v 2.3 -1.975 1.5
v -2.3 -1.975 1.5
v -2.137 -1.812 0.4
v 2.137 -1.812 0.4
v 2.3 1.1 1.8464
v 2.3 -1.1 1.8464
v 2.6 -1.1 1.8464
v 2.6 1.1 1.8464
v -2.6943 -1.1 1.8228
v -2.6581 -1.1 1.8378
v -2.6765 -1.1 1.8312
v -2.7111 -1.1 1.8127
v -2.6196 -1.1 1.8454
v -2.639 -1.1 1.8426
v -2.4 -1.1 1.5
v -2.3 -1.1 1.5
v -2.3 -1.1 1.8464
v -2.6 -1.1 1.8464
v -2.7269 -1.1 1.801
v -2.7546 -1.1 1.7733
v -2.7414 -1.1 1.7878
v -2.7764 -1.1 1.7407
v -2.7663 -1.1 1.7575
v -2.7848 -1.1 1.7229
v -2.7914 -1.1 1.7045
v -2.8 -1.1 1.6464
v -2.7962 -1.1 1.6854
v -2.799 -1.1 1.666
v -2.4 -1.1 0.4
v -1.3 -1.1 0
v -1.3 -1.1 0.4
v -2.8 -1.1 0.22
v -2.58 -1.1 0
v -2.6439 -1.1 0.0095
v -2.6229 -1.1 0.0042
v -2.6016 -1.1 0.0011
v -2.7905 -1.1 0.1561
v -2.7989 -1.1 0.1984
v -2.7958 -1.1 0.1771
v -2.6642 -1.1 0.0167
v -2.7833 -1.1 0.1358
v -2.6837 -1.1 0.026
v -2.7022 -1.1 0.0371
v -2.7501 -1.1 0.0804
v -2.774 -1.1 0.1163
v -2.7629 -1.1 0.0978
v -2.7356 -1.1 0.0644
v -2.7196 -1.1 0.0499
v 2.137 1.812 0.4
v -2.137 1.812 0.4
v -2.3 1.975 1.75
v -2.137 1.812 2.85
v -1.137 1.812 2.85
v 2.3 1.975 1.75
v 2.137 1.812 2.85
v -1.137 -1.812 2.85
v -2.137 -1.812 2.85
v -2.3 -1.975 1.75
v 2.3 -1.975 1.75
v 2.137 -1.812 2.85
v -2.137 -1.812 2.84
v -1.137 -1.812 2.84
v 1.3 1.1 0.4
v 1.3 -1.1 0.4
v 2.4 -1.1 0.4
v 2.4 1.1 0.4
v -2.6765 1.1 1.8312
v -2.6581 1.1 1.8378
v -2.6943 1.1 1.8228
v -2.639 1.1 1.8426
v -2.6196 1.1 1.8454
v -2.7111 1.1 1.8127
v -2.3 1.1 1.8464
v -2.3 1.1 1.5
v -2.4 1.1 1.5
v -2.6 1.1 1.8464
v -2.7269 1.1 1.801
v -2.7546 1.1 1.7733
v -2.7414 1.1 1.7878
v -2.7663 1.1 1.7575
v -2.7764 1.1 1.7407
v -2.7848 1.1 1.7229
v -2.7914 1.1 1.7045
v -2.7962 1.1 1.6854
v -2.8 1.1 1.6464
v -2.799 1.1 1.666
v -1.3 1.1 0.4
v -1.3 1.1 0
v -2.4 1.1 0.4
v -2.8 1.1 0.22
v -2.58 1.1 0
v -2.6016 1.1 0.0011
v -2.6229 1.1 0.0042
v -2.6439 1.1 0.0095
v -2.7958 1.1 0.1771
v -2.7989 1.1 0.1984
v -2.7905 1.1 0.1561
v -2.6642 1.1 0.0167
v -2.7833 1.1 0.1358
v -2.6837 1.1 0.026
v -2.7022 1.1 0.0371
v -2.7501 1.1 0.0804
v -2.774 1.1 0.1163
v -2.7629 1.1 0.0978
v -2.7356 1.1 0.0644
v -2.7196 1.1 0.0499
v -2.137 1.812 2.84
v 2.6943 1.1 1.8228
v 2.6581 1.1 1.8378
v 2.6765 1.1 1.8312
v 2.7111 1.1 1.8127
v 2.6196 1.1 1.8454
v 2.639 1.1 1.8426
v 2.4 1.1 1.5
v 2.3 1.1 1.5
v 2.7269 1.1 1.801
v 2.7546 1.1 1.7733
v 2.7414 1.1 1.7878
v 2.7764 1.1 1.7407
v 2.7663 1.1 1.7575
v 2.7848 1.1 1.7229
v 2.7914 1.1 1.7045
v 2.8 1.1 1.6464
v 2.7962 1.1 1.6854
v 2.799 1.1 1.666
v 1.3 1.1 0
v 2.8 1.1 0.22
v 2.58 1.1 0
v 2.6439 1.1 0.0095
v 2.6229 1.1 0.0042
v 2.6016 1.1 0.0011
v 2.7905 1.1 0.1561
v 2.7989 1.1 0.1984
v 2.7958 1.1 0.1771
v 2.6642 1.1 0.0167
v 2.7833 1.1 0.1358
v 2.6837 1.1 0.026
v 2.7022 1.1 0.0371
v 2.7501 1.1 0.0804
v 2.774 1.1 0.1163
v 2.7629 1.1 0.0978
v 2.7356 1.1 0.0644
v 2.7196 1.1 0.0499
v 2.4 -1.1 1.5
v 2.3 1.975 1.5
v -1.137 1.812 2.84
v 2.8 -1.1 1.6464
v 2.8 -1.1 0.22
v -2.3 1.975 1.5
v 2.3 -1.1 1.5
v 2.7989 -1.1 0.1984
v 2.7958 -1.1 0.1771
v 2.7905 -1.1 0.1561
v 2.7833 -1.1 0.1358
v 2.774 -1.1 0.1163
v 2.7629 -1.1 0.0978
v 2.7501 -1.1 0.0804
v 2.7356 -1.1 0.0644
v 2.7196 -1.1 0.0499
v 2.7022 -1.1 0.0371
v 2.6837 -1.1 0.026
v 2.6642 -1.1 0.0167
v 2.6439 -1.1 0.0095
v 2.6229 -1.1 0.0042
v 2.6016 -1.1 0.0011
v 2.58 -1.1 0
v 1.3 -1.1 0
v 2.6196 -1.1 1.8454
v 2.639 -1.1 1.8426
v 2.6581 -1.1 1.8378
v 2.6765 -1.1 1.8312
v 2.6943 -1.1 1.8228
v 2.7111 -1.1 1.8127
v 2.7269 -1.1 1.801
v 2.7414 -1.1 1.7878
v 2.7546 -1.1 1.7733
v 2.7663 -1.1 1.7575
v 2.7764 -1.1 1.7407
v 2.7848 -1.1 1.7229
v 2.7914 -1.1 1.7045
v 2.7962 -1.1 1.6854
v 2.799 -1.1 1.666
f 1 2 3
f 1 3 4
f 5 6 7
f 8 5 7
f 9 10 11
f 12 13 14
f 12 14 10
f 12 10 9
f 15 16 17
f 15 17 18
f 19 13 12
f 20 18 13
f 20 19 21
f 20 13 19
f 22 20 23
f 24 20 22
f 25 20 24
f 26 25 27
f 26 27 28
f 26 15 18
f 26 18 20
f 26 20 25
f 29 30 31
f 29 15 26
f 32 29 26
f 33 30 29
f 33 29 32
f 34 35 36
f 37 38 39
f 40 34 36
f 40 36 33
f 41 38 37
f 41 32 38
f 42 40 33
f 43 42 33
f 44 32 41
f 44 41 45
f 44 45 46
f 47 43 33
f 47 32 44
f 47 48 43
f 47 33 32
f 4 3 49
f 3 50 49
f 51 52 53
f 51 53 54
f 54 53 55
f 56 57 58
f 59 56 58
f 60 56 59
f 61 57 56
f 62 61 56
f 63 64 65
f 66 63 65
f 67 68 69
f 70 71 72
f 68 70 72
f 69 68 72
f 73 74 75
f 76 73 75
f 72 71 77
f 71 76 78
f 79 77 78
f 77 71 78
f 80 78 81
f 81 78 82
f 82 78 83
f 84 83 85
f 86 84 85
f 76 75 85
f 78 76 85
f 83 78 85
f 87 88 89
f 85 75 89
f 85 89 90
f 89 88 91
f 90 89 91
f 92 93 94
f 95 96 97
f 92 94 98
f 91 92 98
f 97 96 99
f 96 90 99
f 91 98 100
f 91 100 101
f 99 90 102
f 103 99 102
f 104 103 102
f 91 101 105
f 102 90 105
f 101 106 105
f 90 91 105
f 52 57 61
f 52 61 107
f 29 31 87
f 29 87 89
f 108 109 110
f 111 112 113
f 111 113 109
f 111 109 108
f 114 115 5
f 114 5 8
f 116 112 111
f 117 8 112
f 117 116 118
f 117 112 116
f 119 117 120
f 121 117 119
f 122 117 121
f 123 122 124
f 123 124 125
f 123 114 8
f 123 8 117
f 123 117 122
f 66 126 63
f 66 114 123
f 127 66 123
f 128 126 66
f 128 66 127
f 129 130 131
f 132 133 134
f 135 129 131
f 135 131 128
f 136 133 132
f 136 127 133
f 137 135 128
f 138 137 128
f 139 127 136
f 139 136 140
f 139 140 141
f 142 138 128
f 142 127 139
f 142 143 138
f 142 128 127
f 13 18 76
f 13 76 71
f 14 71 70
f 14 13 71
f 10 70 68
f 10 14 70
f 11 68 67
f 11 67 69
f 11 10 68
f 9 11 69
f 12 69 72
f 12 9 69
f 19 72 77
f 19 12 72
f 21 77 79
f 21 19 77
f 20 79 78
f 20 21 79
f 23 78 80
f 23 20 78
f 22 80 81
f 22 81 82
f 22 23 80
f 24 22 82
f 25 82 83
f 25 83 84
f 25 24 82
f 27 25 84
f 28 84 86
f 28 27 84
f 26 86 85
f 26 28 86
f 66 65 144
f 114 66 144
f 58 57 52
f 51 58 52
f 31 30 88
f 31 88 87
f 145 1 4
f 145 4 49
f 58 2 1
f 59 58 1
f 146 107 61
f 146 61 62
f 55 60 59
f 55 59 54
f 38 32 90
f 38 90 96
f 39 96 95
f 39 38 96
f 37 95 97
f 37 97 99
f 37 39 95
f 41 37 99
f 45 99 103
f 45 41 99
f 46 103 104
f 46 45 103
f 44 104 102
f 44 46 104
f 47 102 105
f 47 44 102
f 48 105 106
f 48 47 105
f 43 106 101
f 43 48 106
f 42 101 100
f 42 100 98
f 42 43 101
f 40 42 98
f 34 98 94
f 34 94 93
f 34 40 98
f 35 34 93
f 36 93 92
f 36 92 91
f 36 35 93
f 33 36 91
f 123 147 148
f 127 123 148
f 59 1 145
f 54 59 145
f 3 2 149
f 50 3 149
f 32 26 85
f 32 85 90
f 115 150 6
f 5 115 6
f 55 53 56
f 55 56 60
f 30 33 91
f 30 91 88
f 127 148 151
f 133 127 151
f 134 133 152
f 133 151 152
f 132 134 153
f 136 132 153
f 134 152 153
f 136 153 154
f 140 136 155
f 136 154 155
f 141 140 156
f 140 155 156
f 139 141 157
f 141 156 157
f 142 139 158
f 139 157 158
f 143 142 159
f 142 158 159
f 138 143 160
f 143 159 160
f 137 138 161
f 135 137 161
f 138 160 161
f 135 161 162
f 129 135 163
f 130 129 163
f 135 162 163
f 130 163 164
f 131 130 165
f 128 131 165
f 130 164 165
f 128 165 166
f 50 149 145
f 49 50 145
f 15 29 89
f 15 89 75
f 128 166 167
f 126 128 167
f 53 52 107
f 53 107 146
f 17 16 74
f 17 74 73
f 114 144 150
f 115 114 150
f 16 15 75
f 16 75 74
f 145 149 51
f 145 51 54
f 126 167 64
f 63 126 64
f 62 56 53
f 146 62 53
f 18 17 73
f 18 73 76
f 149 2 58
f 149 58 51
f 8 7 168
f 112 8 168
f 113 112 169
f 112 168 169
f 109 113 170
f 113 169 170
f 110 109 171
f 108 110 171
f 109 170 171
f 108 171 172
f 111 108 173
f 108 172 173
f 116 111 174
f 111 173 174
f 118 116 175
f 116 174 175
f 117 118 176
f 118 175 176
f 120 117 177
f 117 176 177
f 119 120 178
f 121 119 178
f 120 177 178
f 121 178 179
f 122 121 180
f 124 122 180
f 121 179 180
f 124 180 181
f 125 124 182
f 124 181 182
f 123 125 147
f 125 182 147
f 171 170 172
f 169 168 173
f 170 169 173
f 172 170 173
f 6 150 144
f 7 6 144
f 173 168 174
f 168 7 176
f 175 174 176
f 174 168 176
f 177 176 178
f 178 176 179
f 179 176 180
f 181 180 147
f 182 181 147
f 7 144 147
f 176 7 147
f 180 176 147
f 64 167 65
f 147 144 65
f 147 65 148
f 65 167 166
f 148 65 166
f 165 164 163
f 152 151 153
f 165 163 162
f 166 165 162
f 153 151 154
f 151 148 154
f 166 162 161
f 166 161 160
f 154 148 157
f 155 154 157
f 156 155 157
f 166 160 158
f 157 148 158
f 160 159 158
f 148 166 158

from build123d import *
from OCP.BRepFilletAPI import BRepFilletAPI_MakeChamfer

# Parameters (mm, degrees)
SKETCH_1_W           = 4.6
SKETCH_1_H           = 3.95
EXTRUDE_1_DEPTH      = 2.45
CHAMFER_1_SIZE       = 1.1
CHAMFER_1_SIZE2      = 0.163
CHAMFER_2_SIZE       = 0.163
CHAMFER_2_SIZE2      = 1.1
EXTRUDE_2_DEPTH      = 1.1
EXTRUDE_2_DEPTH_BACK = 1.1
SKETCH_3_W           = 1
SKETCH_3_H           = 3.624
CUT_EXTRUDE_1_DEPTH  = 0.01


with BuildPart() as part:
    # Эскиз1 → Бобышка-Вытянуть1 (new body)
    with BuildSketch(Plane.XY.offset(0.4)):
        Rectangle(SKETCH_1_W, SKETCH_1_H)
    extrude(amount=EXTRUDE_1_DEPTH)

    # Фаска1: one chamfer whose edges measure the first distance from different faces: ONE call of the kernel's chamfer builder (chamfer() names one face for all edges)
    chamfer_1_edges_1 = [part.edges().sort_by_distance(p)[0] for p in [
        (-2.3, 0, 2.85),
    ]]
    chamfer_1_side_1 = [part.faces().sort_by_distance(p)[0] for p in [
        (-2.3, 0, 1.625),
    ]]
    chamfer_1_edges_2 = [part.edges().sort_by_distance(p)[0] for p in [
        (0, -1.975, 2.85),
    ]]
    chamfer_1_side_2 = [part.faces().sort_by_distance(p)[0] for p in [
        (0, -1.975, 1.625),
    ]]
    chamfer_1_edges_3 = [part.edges().sort_by_distance(p)[0] for p in [
        (2.3, 0, 2.85),
    ]]
    chamfer_1_side_3 = [part.faces().sort_by_distance(p)[0] for p in [
        (2.3, 0, 1.625),
    ]]
    chamfer_1_edges_4 = [part.edges().sort_by_distance(p)[0] for p in [
        (0, 1.975, 2.85),
    ]]
    chamfer_1_side_4 = [part.faces().sort_by_distance(p)[0] for p in [
        (0, 1.975, 1.625),
    ]]
    chamfer_1 = BRepFilletAPI_MakeChamfer(part.part.solid().wrapped)
    for e in chamfer_1_edges_1:
        chamfer_1.Add(CHAMFER_1_SIZE, CHAMFER_1_SIZE2, e.wrapped, chamfer_1_side_1[0].wrapped)  # the first distance lies on this face
    for e in chamfer_1_edges_2:
        chamfer_1.Add(CHAMFER_1_SIZE, CHAMFER_1_SIZE2, e.wrapped, chamfer_1_side_2[0].wrapped)  # the first distance lies on this face
    for e in chamfer_1_edges_3:
        chamfer_1.Add(CHAMFER_1_SIZE, CHAMFER_1_SIZE2, e.wrapped, chamfer_1_side_3[0].wrapped)  # the first distance lies on this face
    for e in chamfer_1_edges_4:
        chamfer_1.Add(CHAMFER_1_SIZE, CHAMFER_1_SIZE2, e.wrapped, chamfer_1_side_4[0].wrapped)  # the first distance lies on this face
    add(Compound.cast(chamfer_1.Shape()), mode=Mode.REPLACE)

    # Фаска2
    chamfer_2_edges = [part.edges().sort_by_distance(p)[0] for p in [
        (0, -1.975, 0.4),
        (-2.3, 0, 0.4),
        (0, 1.975, 0.4),
        (2.3, 0, 0.4),
    ]]
    chamfer_2_side = [part.faces().sort_by_distance(p)[0] for p in [
        (0, 0, 0.4),
    ]]
    chamfer(chamfer_2_edges, length=CHAMFER_2_SIZE, length2=CHAMFER_2_SIZE2, reference=chamfer_2_side[0])

    # Эскиз3 → Вырез-Вытянуть1 (cut)
    with BuildSketch(Plane.XY.offset(2.85)):
        with Locations((-1.637, 0)):
            Rectangle(SKETCH_3_W, SKETCH_3_H)
    extrude(amount=-CUT_EXTRUDE_1_DEPTH, mode=Mode.SUBTRACT)


with BuildPart() as body_2:
    # Эскиз2 → Бобышка-Вытянуть2 (new, two sides: drawn at the far end of the back side and taken through both)
    with BuildSketch(Plane(origin=(0, 0, 0), x_dir=(1, 0, 0), z_dir=(0, 1, 0)).offset(-EXTRUDE_2_DEPTH_BACK)):
        with BuildLine():
            Line((-2.4, -0.4), (-2.4, -1.5))
            Line((-2.4, -1.5), (-2.3, -1.5))
            Line((-2.3, -1.5), (-2.3, -1.846410162))
            Line((-2.3, -1.846410162), (-2.6, -1.846410162))
            ThreePointArc((-2.6, -1.846410162), (-2.741421356, -1.787831518), (-2.8, -1.646410162))
            Line((-2.8, -1.646410162), (-2.8, -0.22))
            ThreePointArc((-2.8, -0.22), (-2.735563492, -0.064436508), (-2.58, 0))
            Line((-2.58, 0), (-1.3, 0))
            Line((-1.3, 0), (-1.3, -0.4))
            Line((-1.3, -0.4), (-2.4, -0.4))
        make_face()
    extrude(amount=EXTRUDE_2_DEPTH + EXTRUDE_2_DEPTH_BACK)


with BuildPart() as body_3:
    # Зеркальное отражение1: mirrored copy
    add(body_2.part.mirror(Plane(origin=(0, 0, 0), x_dir=(0, 0, 1), z_dir=(1, 0, 0))))


solid = Compound([part.part, body_2.part, body_3.part])
